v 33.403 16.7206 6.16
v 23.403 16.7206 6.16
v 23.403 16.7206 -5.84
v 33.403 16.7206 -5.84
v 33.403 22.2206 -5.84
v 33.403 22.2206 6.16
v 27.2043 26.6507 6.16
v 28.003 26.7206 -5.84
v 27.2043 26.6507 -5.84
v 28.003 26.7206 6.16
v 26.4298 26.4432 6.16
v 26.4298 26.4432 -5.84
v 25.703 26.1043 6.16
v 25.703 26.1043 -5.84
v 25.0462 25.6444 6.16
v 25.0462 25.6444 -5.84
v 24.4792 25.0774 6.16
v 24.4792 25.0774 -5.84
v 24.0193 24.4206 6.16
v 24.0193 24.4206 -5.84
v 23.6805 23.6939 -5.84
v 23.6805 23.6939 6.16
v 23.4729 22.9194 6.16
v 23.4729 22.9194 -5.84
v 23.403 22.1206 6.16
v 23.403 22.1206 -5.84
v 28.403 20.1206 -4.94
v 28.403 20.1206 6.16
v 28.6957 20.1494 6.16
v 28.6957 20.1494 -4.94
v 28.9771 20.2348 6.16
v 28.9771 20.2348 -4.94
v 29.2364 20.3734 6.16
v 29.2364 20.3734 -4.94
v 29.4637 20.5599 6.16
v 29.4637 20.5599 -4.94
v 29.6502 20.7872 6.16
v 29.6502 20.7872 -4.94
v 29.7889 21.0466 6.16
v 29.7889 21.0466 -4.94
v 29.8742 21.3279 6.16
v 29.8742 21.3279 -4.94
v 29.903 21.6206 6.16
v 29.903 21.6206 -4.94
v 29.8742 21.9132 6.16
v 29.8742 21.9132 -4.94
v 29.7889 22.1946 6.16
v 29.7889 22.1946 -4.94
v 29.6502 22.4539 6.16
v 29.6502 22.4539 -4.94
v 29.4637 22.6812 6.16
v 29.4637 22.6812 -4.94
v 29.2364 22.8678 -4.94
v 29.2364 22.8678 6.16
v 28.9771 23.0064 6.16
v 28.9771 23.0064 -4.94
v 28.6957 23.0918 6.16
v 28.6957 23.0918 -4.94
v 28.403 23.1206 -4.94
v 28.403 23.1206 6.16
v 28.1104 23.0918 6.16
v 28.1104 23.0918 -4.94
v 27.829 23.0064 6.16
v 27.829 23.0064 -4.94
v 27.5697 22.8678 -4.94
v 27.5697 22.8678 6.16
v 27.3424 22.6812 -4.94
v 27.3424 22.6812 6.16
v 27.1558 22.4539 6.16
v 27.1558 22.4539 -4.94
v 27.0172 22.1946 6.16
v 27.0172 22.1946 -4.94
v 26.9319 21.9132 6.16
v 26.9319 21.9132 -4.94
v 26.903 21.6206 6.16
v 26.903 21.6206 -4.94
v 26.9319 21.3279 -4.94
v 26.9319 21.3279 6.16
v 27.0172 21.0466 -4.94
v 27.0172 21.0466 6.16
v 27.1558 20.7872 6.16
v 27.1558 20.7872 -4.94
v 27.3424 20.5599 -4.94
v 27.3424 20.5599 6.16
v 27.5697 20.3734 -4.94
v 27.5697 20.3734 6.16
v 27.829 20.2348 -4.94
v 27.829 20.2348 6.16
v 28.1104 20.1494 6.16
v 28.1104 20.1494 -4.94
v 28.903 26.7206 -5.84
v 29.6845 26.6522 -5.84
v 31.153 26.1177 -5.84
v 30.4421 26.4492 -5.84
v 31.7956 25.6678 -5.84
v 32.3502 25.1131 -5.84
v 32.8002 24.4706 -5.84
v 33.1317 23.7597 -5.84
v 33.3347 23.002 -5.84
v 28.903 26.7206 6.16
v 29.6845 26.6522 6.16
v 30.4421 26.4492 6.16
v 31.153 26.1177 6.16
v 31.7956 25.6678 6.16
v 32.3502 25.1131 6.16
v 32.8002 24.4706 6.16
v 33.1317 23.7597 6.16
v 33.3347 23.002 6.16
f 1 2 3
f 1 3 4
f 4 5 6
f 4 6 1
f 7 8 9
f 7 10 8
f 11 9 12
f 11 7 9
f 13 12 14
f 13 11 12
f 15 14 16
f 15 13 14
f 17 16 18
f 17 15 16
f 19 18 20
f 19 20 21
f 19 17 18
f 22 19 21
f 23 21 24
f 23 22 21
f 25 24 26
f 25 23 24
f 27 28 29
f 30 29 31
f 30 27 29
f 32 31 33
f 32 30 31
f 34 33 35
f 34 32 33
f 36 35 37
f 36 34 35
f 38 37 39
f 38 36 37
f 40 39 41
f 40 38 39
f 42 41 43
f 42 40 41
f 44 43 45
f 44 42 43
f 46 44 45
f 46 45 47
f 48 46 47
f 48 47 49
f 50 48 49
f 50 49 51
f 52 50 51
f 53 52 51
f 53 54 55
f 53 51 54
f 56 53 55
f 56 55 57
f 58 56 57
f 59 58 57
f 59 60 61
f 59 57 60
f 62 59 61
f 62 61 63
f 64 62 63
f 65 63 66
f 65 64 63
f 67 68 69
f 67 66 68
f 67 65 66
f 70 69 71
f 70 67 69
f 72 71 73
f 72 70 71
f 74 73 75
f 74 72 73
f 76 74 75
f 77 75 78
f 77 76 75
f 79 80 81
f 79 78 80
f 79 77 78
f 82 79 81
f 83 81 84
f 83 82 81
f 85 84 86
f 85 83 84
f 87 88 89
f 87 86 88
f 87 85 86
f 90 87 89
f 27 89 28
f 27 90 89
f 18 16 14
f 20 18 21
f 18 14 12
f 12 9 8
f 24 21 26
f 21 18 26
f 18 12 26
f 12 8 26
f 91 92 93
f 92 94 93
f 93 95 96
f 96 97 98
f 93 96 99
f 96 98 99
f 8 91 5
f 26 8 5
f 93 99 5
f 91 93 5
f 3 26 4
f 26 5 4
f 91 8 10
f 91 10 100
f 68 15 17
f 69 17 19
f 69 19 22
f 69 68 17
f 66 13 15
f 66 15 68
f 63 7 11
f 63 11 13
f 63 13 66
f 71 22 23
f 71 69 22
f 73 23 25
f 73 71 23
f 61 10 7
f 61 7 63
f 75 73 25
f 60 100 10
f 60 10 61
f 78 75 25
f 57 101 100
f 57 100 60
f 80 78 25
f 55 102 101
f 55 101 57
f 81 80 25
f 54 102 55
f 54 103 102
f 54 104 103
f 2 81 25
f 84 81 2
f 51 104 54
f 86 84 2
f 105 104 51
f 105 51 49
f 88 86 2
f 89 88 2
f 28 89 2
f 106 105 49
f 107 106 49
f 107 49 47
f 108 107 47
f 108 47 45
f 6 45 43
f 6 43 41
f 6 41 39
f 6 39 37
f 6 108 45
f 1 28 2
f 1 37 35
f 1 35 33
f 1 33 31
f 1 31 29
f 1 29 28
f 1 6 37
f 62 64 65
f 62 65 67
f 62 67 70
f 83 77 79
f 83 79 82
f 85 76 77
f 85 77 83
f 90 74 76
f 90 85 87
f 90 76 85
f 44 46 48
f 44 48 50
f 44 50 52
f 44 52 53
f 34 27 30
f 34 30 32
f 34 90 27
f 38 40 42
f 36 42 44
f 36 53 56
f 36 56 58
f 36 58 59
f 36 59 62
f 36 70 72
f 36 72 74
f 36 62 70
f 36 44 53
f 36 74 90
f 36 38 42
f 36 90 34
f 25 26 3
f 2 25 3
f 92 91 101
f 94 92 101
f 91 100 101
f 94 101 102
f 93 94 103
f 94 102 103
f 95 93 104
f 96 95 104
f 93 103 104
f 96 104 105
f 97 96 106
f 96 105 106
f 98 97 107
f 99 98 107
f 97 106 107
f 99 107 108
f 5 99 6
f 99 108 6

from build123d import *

# Parameters (mm, degrees)
CYLINDER003_R             = 1.5
CYLINDER003_DEPTH         = 20
BOX037_W                  = 10
BOX037_H                  = 10
BOX037_DEPTH              = 12
FILLET013_R               = 4.5
FILLET014_R               = 4.6
FILLET014_PLACEMENT_ANGLE = 90


with BuildPart() as cylinder003:
    # Cylinder003 → Cylinder003 (new body)
    with BuildSketch(Plane(origin=(-103.2, 5, -48.3), x_dir=(1, 0, 0), z_dir=(0, 0, 1))):
        Circle(CYLINDER003_R)
    extrude(amount=CYLINDER003_DEPTH)


with BuildPart() as fillet014:
    # Box037 → Box037 (new body)
    with BuildSketch(Plane(origin=(-108.3, 0, -49.2), x_dir=(1, 0, 0), z_dir=(0, 0, 1))):
        with Locations((5, 5)):
            Rectangle(BOX037_W, BOX037_H)
    extrude(amount=BOX037_DEPTH)

    # Cut020: cut Cylinder003
    add(cylinder003.part, mode=Mode.SUBTRACT)

    # Fillet013
    fillet013_edges = [fillet014.edges().sort_by_distance(p)[0] for p in [
        (-108.3, 10, -43.2),
    ]]
    fillet(fillet013_edges, radius=FILLET013_R)

    # Fillet014
    fillet014_edges = [fillet014.edges().sort_by_distance(p)[0] for p in [
        (-108.3, 0, -43.2),
    ]]
    fillet(fillet014_edges, radius=FILLET014_R)


with BuildPart() as fillet014_1:
    # Fillet014 placement: moved
    add(fillet014.part.moved(Location((23.403045, -81.579418, 43.36))).rotate(Axis((23.403045, -81.579418, 43.36), (0, 0, -1)), FILLET014_PLACEMENT_ANGLE))


solid = fillet014_1.part
